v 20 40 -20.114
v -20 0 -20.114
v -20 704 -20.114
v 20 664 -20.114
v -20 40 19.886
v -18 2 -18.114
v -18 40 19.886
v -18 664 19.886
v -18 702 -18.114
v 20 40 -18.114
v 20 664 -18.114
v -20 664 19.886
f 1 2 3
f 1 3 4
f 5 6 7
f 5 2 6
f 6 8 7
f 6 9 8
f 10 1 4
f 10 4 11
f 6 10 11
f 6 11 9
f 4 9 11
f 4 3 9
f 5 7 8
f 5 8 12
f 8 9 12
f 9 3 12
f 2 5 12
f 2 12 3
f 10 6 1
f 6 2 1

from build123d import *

# Parameters (mm, degrees)
BOSS_EXTRU_1_DEPTH      = 704
ENL_V_MAT_EXTRU_1_DEPTH = 590
ENL_V_MAT_EXTRU_2_DEPTH = 590
ENL_V_MAT_EXTRU_3_DEPTH = 41
ENL_V_MAT_EXTRU_4_DEPTH = 41


with BuildPart() as part:
    # Esquisse1 → Boss.-Extru.1 (new body)
    with BuildSketch(Plane(origin=(0, 0, 0), x_dir=(1, 0, 0), z_dir=(0, 1, 0))):
        Polygon((-20, 20.113636364), (20, 20.113636364), (20, 18.113636364), (-18, 18.113636364), (-18, -19.886363636), (-20, -19.886363636), align=None)
    extrude(amount=BOSS_EXTRU_1_DEPTH)

    # Esquisse2 → Enlèv. mat.-Extru.1 (cut)
    with BuildSketch(Plane(origin=(0, 0, -20.113636364), x_dir=(-1, 0, 0), z_dir=(0, 0, -1))):
        Polygon((20, 0), (-20, 40), (-20, 0), align=None)
    extrude(amount=-ENL_V_MAT_EXTRU_1_DEPTH, mode=Mode.SUBTRACT)

    # Esquisse3 → Enlèv. mat.-Extru.2 (cut)
    with BuildSketch(Plane.ZY.offset(20)):
        Polygon((-20.113636364, 0), (19.886363636, 40), (19.886363636, 0), align=None)
    extrude(amount=-ENL_V_MAT_EXTRU_2_DEPTH, mode=Mode.SUBTRACT)

    # Esquisse4 → Enlèv. mat.-Extru.3 (cut, through all)
    with BuildSketch(Plane.ZY.offset(20)):
        Polygon((-20.113636364, 704), (19.886363636, 664), (19.886363636, 704), align=None)
    extrude(amount=-ENL_V_MAT_EXTRU_3_DEPTH, mode=Mode.SUBTRACT)

    # Esquisse5 → Enlèv. mat.-Extru.4 (cut, through all)
    with BuildSketch(Plane(origin=(0, 0, -20.113636364), x_dir=(-1, 0, 0), z_dir=(0, 0, -1))):
        Polygon((20, 704), (-20, 664), (-20, 704), align=None)
    extrude(amount=-ENL_V_MAT_EXTRU_4_DEPTH, mode=Mode.SUBTRACT)


solid = part.part
